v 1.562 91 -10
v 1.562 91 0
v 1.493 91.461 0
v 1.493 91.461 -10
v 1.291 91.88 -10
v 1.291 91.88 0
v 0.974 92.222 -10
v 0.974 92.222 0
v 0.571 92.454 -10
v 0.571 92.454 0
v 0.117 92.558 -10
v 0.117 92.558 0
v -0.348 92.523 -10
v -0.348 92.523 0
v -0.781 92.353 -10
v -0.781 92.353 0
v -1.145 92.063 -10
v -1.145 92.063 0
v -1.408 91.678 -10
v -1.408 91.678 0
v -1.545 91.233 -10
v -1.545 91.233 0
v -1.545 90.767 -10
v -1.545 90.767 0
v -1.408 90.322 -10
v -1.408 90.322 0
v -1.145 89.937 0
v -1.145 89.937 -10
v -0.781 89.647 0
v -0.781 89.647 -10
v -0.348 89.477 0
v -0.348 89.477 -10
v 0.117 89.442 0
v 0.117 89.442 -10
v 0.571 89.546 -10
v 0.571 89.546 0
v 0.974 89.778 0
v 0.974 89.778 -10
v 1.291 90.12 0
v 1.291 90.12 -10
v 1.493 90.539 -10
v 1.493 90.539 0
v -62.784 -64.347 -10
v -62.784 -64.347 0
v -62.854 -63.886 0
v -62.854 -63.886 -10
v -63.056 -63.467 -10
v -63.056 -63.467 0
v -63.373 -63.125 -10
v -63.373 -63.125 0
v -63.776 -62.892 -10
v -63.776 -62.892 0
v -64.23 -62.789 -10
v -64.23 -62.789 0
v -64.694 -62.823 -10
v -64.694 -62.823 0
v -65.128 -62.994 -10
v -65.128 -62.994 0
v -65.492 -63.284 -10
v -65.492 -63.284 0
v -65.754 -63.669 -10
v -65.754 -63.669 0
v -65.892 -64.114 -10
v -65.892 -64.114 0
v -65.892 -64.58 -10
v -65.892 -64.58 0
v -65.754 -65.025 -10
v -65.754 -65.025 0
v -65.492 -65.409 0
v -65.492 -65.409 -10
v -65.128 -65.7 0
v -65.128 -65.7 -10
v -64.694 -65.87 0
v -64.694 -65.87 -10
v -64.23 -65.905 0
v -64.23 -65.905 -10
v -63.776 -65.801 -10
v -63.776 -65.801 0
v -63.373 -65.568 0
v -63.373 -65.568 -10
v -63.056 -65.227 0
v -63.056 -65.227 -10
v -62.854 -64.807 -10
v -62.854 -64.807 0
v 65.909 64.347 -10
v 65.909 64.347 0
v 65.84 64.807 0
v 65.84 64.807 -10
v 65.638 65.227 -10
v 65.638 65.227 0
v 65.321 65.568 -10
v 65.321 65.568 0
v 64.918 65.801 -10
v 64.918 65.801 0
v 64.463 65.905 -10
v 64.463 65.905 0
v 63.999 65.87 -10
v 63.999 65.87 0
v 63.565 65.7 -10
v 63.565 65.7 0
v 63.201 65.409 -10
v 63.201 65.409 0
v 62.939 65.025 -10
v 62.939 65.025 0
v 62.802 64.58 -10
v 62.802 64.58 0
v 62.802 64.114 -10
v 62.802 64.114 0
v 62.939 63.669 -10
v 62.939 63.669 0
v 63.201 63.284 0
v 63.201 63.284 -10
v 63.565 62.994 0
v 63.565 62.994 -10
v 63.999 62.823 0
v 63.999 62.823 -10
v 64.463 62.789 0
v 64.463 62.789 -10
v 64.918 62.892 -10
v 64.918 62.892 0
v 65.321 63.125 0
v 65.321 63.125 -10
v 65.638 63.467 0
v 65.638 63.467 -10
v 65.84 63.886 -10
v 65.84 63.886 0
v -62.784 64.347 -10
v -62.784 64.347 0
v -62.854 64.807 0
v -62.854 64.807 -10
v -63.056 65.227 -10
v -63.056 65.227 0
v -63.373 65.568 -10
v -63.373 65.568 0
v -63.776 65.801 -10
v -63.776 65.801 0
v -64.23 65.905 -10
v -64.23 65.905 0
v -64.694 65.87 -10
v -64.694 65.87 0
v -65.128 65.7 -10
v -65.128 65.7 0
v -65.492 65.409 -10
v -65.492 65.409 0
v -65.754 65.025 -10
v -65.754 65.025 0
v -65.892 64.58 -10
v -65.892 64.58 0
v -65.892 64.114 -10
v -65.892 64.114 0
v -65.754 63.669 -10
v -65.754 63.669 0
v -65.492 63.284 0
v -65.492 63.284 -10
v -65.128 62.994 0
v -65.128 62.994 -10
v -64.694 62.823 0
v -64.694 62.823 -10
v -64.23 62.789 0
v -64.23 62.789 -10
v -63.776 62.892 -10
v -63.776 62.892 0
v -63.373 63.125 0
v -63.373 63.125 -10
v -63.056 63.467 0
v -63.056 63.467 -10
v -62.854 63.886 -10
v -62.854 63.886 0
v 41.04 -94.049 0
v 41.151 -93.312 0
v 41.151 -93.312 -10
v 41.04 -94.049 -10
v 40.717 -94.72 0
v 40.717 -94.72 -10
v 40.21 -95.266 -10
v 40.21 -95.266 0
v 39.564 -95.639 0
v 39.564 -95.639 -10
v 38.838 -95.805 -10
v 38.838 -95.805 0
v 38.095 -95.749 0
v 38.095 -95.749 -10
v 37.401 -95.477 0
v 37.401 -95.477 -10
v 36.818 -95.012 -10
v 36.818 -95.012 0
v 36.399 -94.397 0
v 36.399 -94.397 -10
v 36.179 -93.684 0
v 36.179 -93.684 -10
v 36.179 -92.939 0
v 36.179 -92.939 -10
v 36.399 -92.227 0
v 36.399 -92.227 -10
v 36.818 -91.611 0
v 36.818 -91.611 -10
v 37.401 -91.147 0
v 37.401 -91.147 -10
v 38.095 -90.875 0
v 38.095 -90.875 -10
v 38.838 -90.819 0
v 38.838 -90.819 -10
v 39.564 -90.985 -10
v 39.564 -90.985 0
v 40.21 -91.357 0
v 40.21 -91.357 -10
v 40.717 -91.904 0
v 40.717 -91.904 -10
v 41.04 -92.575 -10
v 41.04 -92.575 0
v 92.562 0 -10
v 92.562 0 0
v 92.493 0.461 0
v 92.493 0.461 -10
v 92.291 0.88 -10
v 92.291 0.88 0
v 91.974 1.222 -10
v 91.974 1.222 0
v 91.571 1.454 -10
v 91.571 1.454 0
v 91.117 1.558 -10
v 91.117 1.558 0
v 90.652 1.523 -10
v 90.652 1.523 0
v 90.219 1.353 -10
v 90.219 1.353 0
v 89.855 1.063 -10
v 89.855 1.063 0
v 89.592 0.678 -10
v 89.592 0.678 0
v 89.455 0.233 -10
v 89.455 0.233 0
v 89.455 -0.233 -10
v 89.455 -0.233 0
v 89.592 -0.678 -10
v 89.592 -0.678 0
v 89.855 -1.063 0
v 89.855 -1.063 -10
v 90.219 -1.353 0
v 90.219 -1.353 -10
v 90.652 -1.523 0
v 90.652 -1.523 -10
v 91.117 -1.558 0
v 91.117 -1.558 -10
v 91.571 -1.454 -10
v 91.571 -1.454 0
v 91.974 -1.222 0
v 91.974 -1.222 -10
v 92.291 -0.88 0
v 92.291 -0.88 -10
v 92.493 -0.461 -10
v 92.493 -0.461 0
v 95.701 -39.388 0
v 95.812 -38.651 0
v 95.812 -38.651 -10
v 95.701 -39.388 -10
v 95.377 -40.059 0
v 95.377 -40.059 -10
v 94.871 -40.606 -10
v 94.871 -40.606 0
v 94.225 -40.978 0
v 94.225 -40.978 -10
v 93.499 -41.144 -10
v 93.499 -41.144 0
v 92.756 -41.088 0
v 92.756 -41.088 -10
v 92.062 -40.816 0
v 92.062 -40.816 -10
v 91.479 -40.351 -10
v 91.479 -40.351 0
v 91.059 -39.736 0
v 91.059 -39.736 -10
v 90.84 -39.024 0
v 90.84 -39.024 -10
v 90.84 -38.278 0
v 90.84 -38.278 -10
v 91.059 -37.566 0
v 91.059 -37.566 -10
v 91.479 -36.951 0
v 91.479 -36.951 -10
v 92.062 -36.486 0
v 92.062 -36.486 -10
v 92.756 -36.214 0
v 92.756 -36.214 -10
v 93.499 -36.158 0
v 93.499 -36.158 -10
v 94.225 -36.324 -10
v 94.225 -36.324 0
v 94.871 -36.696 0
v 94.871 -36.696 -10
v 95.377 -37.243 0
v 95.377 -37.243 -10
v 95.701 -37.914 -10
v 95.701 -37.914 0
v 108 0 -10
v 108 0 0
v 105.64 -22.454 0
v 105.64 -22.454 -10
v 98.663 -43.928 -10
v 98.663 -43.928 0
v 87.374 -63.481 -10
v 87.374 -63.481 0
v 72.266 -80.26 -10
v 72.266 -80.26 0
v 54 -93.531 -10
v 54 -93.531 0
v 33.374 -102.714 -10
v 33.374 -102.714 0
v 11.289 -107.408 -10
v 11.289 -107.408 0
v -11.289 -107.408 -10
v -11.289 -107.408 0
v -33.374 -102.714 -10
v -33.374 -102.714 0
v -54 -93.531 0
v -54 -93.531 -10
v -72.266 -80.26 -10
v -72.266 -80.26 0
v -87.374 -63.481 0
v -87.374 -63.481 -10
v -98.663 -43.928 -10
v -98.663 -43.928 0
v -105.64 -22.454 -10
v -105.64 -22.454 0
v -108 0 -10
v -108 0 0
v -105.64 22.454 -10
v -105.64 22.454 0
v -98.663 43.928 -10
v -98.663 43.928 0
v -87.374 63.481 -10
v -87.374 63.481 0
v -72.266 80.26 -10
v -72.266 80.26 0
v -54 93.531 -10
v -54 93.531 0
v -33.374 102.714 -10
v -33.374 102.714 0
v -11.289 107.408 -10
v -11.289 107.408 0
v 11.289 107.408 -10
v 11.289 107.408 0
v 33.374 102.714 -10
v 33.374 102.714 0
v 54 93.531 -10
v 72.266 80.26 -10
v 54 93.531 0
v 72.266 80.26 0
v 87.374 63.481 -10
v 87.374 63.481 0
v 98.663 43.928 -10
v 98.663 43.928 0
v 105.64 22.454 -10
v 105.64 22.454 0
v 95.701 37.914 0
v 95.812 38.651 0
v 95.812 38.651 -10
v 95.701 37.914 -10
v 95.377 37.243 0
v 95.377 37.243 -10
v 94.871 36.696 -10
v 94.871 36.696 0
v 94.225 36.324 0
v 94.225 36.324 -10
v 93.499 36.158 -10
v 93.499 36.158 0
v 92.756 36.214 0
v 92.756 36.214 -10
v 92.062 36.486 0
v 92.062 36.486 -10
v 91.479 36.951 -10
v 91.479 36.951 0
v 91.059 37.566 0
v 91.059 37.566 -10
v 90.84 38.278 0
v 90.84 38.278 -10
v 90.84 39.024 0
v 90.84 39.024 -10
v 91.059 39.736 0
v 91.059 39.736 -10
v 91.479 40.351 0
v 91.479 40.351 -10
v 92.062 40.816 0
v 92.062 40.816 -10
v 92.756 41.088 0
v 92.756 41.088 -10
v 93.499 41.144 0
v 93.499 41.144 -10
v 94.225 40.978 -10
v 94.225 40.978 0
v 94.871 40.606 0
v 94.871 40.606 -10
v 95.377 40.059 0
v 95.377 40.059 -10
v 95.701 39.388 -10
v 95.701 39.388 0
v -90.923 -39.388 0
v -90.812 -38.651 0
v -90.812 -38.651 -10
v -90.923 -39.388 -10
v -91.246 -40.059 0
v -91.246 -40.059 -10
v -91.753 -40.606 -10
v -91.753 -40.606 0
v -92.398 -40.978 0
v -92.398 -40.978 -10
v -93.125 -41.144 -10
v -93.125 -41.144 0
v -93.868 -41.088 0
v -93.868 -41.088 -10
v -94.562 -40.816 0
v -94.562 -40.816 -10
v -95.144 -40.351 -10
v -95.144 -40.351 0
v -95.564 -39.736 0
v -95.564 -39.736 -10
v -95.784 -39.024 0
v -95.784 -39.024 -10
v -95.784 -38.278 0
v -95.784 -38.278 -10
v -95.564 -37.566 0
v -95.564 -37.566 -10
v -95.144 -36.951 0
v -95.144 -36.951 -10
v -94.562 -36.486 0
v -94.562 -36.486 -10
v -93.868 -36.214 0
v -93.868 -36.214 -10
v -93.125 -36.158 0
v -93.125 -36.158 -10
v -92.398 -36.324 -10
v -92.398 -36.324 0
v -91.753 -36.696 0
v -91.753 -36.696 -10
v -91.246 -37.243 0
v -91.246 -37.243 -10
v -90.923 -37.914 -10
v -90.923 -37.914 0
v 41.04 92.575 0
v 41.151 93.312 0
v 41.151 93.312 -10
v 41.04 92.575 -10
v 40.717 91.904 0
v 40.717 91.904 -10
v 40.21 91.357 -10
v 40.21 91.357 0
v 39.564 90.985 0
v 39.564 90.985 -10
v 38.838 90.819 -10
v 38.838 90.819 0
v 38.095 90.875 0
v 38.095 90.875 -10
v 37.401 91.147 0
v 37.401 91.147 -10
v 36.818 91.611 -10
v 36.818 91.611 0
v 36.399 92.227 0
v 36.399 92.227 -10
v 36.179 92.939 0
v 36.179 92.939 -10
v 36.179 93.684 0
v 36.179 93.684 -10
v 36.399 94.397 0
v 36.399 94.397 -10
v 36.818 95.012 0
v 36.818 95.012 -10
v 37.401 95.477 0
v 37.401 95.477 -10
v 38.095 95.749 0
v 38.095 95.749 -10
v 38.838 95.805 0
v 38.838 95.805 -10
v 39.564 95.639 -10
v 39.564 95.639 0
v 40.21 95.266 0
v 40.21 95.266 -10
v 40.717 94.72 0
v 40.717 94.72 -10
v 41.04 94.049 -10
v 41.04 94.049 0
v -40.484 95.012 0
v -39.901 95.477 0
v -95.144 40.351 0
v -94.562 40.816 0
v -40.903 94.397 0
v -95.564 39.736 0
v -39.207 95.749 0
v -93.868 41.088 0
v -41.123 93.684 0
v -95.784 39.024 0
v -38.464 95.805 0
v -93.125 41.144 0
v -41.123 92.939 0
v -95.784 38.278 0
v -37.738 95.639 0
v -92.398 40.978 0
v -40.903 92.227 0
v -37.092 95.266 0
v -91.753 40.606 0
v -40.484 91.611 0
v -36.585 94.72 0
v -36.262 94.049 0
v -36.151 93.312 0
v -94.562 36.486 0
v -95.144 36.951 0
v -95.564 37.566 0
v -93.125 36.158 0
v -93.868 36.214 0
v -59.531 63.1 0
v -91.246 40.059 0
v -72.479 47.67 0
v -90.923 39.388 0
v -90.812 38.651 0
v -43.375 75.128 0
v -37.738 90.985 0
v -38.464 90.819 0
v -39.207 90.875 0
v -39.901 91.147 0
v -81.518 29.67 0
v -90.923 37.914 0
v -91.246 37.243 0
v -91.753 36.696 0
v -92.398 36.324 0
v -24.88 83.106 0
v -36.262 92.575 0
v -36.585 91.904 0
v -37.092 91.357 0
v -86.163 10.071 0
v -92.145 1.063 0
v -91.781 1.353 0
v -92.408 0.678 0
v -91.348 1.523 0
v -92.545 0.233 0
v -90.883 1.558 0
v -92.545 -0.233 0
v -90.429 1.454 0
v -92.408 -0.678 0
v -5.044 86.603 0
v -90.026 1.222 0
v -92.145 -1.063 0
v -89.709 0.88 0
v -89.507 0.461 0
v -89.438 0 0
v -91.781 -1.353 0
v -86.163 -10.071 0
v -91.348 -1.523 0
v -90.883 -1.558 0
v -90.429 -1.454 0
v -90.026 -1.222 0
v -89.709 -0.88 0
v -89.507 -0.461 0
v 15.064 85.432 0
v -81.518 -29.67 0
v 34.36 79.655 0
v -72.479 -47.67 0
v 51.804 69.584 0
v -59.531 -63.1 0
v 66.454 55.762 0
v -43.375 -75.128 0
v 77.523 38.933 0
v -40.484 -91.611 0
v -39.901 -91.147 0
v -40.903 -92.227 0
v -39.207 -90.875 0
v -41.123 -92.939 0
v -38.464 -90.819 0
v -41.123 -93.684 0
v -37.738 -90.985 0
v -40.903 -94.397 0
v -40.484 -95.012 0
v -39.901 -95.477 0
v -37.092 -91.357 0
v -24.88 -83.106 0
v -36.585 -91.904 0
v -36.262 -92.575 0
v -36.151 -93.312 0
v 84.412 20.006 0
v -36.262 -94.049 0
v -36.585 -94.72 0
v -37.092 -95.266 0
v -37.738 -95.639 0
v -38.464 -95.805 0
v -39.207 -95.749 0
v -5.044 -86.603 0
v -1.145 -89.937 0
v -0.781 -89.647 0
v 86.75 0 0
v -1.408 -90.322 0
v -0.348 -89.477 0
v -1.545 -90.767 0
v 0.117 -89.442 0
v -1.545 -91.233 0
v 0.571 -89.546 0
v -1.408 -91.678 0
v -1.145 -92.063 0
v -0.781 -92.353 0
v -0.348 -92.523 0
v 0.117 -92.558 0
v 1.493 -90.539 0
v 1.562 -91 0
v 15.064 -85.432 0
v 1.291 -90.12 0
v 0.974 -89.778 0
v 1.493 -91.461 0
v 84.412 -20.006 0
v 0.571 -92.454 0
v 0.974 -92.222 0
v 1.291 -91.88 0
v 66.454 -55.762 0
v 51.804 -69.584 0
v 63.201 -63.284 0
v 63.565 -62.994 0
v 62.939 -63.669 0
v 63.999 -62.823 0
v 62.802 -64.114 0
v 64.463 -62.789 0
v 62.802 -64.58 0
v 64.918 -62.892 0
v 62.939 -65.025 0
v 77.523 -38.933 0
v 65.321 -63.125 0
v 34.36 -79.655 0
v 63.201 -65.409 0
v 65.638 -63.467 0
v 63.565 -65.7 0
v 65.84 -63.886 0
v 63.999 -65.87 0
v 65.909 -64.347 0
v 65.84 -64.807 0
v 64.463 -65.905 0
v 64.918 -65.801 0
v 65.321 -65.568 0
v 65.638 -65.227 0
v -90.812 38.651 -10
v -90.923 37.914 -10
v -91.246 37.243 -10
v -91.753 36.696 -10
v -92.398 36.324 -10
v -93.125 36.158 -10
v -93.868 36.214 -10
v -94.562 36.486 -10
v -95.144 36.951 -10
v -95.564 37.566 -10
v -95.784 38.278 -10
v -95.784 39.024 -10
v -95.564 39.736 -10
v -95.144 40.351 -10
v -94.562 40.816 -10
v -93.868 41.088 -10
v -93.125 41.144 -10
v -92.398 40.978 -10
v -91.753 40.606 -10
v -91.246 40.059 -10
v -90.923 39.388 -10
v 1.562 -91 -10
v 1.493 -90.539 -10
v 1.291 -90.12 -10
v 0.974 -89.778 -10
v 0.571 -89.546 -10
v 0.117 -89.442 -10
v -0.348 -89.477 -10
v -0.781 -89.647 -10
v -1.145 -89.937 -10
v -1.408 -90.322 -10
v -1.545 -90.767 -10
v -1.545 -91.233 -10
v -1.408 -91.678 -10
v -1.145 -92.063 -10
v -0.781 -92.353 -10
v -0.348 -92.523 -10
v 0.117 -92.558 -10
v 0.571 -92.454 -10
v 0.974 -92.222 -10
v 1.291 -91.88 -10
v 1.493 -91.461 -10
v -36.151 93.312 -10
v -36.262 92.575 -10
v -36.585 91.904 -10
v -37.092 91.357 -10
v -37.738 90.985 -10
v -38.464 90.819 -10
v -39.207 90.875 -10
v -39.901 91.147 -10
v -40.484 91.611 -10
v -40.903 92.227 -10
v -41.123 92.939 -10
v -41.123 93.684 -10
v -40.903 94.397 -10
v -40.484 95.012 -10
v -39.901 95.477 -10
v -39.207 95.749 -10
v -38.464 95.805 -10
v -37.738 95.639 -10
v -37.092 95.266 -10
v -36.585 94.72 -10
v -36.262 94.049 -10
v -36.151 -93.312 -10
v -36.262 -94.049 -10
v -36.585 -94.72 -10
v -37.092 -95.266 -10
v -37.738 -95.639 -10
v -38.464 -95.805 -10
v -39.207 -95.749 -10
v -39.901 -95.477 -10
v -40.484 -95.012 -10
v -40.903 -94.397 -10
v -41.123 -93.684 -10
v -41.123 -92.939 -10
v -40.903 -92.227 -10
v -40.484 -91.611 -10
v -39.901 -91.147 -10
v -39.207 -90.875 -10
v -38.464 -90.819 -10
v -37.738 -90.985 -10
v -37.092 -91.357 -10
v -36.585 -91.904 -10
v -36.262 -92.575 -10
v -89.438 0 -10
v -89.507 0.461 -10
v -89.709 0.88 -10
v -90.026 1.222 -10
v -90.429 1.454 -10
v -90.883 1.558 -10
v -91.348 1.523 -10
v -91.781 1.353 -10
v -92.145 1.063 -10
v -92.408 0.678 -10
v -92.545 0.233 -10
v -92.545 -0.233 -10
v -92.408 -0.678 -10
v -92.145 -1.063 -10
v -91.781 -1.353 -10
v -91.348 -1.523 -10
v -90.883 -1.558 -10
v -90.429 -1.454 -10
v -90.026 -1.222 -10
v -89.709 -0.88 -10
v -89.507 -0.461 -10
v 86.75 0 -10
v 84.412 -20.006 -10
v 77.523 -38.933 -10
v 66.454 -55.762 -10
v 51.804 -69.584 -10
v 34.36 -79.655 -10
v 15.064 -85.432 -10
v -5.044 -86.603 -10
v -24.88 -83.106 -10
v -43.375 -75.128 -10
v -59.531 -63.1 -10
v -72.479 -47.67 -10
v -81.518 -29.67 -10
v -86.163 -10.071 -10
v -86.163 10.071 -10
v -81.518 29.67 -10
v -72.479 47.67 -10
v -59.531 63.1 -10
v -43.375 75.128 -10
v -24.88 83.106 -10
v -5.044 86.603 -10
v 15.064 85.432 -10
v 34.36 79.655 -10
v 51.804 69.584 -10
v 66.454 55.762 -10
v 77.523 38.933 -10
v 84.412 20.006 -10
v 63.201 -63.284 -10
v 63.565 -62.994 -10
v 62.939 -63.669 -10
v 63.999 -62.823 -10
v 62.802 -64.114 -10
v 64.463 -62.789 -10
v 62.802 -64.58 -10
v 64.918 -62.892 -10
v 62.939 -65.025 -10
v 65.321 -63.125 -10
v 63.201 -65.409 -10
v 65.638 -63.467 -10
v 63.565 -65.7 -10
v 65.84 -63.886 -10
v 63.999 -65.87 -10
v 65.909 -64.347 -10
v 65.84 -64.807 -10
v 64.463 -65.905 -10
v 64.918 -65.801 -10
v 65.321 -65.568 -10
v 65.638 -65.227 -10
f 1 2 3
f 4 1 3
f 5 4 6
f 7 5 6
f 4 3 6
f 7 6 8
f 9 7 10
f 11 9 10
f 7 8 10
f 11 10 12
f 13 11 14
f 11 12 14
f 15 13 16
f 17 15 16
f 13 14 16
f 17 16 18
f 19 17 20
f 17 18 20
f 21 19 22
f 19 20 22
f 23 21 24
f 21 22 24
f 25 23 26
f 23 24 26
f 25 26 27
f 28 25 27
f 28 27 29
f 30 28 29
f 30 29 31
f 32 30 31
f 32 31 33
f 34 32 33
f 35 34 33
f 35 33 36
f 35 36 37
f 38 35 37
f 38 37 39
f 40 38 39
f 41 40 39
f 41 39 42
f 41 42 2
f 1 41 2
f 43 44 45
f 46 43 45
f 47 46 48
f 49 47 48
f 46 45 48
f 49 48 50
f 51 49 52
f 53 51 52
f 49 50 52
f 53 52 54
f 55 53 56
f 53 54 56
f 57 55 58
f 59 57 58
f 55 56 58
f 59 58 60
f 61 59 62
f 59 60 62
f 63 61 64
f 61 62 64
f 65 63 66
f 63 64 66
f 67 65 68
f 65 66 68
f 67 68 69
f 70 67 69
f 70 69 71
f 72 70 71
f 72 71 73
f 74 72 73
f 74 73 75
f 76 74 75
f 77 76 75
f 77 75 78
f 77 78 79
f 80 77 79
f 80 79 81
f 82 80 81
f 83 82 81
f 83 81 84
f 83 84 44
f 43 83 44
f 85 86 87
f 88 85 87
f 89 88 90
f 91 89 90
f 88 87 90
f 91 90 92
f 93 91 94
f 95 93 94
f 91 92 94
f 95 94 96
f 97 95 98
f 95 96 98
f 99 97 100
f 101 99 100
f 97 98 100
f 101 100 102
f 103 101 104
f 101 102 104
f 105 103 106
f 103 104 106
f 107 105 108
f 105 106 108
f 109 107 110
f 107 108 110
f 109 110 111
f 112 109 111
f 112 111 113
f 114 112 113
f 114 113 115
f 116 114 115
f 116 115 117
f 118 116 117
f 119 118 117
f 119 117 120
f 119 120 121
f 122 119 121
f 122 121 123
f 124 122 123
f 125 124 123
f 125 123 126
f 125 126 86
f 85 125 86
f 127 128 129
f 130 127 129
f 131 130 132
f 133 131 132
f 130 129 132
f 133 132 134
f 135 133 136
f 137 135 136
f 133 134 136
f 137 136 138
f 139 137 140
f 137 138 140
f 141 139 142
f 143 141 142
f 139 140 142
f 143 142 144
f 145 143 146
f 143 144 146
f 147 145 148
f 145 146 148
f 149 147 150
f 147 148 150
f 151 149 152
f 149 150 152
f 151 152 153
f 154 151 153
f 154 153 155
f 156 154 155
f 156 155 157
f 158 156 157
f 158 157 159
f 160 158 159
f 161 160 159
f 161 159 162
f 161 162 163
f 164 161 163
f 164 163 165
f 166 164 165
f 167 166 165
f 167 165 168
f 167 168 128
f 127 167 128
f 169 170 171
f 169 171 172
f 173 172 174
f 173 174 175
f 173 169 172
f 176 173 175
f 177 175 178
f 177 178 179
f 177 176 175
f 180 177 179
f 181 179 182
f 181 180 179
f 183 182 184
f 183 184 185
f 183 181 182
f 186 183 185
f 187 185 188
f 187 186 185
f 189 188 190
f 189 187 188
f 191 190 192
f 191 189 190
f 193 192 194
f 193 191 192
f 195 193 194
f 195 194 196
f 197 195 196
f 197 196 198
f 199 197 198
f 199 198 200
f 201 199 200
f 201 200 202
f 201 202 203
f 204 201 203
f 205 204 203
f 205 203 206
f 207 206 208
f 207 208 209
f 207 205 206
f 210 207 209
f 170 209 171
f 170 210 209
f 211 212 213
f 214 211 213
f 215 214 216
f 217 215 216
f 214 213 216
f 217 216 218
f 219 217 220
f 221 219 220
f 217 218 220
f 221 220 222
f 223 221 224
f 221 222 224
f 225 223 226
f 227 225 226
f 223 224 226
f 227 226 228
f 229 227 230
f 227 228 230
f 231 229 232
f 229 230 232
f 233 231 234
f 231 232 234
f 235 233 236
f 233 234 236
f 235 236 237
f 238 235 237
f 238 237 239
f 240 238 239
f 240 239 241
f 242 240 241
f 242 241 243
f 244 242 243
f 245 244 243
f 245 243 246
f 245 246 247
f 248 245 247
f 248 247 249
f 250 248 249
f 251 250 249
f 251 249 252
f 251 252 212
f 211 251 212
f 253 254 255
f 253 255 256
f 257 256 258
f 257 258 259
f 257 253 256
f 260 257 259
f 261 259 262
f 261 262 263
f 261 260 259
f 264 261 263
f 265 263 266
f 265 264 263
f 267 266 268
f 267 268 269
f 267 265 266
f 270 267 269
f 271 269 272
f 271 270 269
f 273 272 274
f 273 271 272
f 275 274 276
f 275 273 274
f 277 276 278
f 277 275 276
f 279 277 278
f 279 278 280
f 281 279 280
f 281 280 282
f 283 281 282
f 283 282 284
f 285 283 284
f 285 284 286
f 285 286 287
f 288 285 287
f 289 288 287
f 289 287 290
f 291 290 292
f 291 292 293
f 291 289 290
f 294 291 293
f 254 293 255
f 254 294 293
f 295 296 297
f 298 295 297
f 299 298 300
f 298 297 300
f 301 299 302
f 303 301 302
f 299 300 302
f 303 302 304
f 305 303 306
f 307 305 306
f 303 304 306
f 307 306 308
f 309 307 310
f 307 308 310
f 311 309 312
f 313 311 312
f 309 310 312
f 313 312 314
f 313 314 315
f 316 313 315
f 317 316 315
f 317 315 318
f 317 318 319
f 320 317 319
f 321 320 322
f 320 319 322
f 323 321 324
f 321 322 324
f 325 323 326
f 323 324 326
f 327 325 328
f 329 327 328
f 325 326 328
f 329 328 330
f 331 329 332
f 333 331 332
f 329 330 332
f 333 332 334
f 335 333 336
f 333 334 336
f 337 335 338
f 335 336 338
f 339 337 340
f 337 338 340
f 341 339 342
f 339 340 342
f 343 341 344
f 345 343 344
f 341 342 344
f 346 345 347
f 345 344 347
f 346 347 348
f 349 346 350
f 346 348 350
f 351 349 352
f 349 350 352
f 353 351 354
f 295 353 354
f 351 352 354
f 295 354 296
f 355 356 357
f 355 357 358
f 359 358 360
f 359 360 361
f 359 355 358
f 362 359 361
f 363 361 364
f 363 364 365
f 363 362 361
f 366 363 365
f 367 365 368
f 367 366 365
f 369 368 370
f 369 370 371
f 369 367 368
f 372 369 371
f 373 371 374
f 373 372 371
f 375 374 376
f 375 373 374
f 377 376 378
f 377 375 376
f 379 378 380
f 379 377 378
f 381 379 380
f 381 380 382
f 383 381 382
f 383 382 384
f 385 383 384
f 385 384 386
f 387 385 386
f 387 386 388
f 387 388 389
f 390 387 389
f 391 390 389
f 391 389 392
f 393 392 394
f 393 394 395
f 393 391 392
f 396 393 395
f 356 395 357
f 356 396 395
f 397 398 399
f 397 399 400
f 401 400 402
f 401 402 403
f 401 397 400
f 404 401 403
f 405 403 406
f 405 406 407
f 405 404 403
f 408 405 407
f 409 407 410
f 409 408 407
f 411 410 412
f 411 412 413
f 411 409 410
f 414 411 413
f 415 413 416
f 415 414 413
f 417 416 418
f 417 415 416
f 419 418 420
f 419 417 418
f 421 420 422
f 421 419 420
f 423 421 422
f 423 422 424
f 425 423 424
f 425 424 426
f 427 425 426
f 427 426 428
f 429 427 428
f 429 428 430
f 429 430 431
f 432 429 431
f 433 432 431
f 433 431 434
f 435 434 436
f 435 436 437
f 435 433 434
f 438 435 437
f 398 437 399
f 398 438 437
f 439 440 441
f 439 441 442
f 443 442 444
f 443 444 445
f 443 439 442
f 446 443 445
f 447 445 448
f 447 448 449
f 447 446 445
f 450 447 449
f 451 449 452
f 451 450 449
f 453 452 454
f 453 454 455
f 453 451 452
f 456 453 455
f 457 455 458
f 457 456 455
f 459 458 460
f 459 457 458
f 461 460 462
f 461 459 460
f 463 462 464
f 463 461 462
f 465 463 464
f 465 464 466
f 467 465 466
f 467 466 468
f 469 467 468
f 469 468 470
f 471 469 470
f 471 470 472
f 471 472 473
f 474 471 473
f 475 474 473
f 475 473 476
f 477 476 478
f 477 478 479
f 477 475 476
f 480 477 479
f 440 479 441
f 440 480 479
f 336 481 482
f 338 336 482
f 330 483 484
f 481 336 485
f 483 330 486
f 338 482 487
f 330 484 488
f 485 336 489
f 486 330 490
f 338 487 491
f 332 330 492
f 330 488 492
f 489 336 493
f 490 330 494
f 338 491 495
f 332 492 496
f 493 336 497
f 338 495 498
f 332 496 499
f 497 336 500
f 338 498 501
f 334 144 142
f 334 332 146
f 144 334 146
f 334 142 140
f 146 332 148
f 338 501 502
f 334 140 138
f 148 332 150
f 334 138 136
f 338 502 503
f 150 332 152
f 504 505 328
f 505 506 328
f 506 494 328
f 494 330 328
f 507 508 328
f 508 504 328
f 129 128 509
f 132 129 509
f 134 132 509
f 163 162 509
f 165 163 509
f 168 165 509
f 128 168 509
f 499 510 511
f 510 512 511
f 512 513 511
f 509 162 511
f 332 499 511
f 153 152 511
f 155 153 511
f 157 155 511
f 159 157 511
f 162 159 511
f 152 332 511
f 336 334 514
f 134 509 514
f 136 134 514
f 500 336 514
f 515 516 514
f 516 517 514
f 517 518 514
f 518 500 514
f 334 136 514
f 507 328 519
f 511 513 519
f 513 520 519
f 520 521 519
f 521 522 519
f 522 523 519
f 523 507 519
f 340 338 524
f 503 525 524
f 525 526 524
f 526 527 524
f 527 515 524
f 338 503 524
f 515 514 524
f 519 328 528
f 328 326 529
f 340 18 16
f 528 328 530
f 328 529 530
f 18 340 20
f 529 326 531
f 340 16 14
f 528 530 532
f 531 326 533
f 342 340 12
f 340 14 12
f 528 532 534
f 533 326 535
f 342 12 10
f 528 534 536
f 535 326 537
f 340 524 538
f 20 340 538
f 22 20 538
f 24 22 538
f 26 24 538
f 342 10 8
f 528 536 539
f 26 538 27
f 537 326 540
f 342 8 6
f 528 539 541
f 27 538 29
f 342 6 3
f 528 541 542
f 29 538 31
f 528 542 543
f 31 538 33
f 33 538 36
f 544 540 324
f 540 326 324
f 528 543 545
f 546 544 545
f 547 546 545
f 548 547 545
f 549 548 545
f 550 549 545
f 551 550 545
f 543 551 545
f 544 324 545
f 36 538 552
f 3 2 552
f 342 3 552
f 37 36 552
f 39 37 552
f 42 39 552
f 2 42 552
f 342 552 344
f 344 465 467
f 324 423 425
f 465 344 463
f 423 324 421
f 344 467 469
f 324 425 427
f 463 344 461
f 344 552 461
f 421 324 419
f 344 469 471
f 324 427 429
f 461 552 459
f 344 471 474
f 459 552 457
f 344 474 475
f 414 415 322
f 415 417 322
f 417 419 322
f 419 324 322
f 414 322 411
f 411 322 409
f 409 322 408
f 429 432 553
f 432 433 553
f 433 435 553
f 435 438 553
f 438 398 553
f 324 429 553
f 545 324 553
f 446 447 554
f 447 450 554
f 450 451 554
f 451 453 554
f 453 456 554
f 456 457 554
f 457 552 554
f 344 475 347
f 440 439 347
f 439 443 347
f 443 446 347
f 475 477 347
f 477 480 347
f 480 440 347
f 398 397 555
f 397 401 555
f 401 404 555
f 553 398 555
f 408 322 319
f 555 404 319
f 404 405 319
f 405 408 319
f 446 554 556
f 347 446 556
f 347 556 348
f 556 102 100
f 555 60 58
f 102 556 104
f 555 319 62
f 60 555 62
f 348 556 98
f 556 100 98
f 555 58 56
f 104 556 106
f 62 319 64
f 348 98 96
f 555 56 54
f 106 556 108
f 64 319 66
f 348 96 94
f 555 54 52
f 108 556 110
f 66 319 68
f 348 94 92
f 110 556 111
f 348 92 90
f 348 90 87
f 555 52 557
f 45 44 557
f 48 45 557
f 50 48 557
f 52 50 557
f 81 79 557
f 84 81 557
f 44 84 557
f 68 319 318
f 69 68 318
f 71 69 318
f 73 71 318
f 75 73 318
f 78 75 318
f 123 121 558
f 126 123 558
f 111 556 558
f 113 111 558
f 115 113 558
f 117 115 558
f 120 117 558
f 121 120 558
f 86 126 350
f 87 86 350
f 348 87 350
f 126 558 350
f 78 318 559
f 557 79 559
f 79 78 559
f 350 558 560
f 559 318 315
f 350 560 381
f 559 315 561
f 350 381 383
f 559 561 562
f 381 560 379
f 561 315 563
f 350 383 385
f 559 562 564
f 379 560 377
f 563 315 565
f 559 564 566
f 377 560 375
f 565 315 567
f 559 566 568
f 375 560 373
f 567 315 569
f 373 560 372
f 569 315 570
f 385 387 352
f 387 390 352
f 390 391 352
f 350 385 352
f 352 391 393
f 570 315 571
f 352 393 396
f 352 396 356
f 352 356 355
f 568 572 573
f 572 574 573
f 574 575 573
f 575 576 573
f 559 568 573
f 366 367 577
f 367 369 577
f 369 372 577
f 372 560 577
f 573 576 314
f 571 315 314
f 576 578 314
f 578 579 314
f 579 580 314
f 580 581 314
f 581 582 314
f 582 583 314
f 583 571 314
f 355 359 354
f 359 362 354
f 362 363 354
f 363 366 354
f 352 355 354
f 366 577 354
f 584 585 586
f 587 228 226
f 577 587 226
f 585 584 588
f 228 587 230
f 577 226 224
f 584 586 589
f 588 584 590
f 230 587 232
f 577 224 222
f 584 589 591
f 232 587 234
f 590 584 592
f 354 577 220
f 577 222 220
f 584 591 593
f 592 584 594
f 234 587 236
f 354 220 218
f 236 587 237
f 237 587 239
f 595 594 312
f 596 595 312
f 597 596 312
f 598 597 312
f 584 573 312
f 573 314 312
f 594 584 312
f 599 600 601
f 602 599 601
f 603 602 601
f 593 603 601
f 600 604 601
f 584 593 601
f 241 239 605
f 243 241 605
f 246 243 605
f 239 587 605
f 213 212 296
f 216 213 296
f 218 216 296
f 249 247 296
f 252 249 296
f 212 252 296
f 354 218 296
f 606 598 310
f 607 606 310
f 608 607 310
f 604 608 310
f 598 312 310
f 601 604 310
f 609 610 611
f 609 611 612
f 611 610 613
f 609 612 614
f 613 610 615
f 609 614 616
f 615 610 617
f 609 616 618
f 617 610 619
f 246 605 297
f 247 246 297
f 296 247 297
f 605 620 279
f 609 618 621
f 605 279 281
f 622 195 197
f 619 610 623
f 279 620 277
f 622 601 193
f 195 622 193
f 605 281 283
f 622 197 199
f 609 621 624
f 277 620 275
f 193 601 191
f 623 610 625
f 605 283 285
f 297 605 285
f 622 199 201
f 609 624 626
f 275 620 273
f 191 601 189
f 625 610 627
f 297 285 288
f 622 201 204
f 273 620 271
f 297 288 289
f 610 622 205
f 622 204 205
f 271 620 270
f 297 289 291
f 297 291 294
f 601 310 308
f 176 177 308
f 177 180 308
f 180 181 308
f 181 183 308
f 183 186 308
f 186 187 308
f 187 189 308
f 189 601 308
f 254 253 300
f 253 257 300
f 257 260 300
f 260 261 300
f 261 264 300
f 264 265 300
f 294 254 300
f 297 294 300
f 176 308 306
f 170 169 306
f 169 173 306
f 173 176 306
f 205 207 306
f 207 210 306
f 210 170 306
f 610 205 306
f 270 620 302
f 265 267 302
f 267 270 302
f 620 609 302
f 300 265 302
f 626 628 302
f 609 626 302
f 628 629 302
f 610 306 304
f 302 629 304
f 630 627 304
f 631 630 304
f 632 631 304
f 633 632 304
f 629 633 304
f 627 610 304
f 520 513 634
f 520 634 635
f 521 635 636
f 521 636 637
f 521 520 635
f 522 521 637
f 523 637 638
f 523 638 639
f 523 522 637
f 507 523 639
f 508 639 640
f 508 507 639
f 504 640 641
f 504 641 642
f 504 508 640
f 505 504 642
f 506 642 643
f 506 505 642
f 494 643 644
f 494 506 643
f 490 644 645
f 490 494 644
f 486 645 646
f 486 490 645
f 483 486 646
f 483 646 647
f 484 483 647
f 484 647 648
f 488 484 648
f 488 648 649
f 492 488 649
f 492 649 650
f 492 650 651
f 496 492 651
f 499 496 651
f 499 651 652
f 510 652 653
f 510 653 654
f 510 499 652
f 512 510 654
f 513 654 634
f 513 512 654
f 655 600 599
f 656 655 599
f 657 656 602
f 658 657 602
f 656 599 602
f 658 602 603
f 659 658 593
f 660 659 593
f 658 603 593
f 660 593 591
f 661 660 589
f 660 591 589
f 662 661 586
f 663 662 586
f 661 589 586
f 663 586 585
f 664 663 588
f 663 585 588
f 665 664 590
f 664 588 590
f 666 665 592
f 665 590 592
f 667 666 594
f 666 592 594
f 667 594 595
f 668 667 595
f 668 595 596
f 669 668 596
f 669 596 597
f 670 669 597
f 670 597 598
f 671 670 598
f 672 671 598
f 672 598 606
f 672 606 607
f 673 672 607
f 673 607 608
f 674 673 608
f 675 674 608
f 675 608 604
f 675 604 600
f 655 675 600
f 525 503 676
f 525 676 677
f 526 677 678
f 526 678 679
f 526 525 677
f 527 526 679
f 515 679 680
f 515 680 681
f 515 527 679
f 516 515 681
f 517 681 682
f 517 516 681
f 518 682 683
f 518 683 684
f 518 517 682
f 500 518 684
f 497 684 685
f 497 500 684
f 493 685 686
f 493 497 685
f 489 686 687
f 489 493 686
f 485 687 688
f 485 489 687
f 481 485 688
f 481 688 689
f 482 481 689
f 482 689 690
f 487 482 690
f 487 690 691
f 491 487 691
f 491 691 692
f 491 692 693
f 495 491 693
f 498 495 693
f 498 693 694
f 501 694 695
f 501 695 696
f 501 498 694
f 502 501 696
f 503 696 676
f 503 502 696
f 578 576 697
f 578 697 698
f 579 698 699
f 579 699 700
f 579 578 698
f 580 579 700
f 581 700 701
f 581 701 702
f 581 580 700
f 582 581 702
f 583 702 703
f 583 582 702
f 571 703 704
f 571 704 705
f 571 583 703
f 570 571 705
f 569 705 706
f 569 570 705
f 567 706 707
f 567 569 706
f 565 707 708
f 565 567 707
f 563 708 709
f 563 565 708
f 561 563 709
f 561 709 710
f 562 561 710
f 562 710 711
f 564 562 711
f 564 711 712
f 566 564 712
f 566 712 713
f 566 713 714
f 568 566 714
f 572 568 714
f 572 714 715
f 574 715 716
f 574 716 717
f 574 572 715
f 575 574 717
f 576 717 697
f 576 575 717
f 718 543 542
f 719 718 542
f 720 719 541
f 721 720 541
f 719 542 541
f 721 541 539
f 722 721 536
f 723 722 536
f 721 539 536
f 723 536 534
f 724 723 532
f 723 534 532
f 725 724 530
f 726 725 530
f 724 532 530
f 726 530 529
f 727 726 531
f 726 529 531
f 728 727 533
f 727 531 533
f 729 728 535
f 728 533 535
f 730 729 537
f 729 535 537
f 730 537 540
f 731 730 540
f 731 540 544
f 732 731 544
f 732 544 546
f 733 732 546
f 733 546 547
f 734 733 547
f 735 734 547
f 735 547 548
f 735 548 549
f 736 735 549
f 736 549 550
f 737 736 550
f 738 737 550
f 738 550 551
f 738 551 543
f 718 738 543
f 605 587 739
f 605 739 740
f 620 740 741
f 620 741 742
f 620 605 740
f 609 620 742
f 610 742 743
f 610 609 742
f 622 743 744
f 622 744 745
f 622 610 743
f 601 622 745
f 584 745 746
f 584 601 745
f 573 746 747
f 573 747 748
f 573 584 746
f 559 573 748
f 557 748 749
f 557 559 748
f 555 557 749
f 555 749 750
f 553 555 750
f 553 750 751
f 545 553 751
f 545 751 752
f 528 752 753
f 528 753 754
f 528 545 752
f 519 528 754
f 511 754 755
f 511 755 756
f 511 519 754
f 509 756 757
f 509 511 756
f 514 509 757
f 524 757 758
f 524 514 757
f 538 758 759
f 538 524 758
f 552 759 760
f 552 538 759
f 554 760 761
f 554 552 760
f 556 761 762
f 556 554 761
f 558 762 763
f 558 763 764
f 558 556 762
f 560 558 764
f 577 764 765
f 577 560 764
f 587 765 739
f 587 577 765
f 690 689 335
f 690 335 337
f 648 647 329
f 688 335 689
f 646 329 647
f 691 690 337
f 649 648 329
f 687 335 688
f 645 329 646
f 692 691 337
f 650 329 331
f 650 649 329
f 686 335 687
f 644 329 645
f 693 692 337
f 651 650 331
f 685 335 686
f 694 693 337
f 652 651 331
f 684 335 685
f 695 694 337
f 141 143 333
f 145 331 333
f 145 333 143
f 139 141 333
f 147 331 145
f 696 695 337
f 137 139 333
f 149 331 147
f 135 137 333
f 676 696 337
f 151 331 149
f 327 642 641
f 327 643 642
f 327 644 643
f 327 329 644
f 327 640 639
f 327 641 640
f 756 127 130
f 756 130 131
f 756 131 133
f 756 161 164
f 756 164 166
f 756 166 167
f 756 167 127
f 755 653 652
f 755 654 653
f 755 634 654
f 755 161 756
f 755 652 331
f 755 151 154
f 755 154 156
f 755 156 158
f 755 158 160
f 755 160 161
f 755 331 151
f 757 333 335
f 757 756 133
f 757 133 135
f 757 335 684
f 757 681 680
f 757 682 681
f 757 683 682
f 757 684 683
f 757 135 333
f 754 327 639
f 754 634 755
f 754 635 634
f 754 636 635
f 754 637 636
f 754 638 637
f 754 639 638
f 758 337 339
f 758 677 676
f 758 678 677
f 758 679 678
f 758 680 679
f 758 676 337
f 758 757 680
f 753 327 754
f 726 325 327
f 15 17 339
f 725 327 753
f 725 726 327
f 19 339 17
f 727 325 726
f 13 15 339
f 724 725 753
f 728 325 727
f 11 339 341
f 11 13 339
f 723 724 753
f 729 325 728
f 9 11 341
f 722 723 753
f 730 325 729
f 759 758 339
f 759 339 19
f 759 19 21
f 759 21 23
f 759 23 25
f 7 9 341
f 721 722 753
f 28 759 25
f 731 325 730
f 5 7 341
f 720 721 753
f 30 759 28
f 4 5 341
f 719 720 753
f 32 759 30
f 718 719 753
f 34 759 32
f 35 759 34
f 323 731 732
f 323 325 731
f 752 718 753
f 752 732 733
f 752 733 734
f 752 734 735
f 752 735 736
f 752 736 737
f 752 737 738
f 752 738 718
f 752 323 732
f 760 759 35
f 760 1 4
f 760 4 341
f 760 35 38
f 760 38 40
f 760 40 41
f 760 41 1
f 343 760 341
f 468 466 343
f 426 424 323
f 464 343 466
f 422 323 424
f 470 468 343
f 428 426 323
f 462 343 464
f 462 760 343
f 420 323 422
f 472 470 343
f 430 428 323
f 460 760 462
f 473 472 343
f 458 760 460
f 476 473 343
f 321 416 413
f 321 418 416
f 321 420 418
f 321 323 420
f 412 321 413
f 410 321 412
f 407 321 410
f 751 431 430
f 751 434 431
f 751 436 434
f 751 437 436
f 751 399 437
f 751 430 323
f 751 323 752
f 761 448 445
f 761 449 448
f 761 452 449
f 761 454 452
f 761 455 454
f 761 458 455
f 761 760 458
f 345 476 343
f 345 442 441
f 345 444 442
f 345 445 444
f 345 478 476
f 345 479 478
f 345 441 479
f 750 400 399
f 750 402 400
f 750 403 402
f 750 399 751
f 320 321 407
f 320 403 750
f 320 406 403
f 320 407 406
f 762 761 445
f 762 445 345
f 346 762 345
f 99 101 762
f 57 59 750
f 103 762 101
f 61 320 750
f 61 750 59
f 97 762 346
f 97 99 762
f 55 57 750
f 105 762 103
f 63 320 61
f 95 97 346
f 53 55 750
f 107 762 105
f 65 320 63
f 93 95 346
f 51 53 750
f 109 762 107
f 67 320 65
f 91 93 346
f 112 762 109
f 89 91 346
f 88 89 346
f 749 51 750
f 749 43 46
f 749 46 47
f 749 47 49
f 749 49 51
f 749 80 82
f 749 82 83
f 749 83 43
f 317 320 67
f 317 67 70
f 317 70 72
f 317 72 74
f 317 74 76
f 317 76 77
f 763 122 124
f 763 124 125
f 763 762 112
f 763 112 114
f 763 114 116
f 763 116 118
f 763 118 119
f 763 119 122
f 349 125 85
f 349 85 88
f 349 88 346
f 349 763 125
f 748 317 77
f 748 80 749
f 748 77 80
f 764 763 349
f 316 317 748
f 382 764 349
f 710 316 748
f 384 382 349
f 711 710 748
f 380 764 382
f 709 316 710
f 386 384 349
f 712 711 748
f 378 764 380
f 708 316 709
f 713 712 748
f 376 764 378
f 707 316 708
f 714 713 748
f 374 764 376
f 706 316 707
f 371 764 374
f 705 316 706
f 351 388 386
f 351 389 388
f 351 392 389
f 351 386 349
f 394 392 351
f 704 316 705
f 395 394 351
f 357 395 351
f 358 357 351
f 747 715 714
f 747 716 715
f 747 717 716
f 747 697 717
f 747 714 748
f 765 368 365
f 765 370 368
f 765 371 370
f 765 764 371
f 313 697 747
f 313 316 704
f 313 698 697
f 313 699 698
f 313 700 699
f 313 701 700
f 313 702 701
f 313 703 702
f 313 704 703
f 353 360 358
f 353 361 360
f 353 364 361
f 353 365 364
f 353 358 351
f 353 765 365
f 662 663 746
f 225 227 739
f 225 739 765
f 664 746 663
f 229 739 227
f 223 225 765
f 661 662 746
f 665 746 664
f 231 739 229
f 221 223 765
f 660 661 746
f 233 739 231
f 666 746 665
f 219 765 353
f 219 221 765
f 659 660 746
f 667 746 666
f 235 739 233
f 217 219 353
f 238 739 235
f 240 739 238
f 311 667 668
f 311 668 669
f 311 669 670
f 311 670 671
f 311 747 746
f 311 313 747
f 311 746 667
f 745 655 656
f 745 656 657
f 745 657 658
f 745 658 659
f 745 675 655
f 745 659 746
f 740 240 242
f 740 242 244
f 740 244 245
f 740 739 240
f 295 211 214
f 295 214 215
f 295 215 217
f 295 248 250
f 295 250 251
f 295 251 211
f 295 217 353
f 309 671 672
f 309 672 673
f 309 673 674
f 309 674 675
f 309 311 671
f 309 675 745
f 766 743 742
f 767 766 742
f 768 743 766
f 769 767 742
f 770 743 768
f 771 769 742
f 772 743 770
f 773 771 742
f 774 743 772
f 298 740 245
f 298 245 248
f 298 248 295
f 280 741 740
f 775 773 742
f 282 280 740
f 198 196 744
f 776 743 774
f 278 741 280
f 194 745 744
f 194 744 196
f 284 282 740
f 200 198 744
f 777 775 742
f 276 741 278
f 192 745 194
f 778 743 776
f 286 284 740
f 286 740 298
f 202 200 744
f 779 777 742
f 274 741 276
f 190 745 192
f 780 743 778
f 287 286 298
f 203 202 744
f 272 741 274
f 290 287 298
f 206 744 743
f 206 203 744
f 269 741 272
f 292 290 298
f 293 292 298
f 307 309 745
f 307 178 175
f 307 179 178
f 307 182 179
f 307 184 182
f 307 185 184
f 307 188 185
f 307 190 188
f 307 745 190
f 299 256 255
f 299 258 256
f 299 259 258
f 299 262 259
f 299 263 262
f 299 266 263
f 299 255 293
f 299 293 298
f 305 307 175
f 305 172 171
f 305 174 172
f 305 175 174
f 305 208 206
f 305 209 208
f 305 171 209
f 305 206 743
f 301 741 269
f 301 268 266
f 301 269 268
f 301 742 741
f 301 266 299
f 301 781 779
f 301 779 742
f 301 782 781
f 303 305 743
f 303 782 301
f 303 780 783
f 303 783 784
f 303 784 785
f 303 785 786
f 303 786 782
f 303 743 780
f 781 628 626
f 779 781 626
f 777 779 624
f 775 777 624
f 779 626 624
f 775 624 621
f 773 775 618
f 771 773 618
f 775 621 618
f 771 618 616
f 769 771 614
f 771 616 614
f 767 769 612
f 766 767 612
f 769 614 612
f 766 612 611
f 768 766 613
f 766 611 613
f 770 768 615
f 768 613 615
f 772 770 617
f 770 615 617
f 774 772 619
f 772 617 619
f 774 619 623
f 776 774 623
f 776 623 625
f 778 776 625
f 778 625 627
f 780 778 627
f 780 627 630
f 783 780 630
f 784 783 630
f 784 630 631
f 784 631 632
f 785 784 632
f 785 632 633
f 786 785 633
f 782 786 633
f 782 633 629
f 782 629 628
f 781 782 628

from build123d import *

# Parameters (mm, degrees)
SKETCH001_R       = 108
SKETCH001_R_2     = 86.75
SKETCH001_R_3     = 2.5
PAD_DEPTH         = 10
SKETCH_R          = 1.5625
POCKET_DEPTH      = 10.001
POCKET_DEPTH_BACK = 0.001


with BuildPart() as part:
    # Sketch001 → Pad (new body)
    with BuildSketch(Plane(origin=(0, 0, 0), x_dir=(1, 0, 0), z_dir=(0, 0, -1))):
        Circle(SKETCH001_R)
        Circle(SKETCH001_R_2, mode=Mode.SUBTRACT)
        with Locations((38.651027, 93.311833)):
            Circle(SKETCH001_R_3, mode=Mode.SUBTRACT)
        with Locations((93.311833, 38.651027)):
            Circle(SKETCH001_R_3, mode=Mode.SUBTRACT)
        with Locations((93.311833, -38.651027)):
            Circle(SKETCH001_R_3, mode=Mode.SUBTRACT)
        with Locations((38.651027, -93.311833)):
            Circle(SKETCH001_R_3, mode=Mode.SUBTRACT)
        with Locations((-38.651027, 93.311833)):
            Circle(SKETCH001_R_3, mode=Mode.SUBTRACT)
        with Locations((-93.311833, 38.651027)):
            Circle(SKETCH001_R_3, mode=Mode.SUBTRACT)
        with Locations((-93.311833, -38.651027)):
            Circle(SKETCH001_R_3, mode=Mode.SUBTRACT)
        with Locations((-38.651027, -93.311833)):
            Circle(SKETCH001_R_3, mode=Mode.SUBTRACT)
    extrude(amount=PAD_DEPTH)

    # Sketch → Pocket (cut, two sides)
    with BuildSketch(Plane.XY) as pocket_sk:
        with Locations((64.346717, 64.346717)):
            Circle(SKETCH_R)
        with Locations((0, 91)):
            Circle(SKETCH_R)
        with Locations((91, 0)):
            Circle(SKETCH_R)
        with Locations((64.346717, -64.346717)):
            Circle(SKETCH_R)
        with Locations((0, -91)):
            Circle(SKETCH_R)
        with Locations((-91, 0)):
            Circle(SKETCH_R)
        with Locations((-64.346717, -64.346717)):
            Circle(SKETCH_R)
        with Locations((-64.346717, 64.346717)):
            Circle(SKETCH_R)
    extrude(amount=-POCKET_DEPTH, mode=Mode.SUBTRACT)
    extrude(pocket_sk.sketch, amount=POCKET_DEPTH_BACK, mode=Mode.SUBTRACT)


solid = part.part
